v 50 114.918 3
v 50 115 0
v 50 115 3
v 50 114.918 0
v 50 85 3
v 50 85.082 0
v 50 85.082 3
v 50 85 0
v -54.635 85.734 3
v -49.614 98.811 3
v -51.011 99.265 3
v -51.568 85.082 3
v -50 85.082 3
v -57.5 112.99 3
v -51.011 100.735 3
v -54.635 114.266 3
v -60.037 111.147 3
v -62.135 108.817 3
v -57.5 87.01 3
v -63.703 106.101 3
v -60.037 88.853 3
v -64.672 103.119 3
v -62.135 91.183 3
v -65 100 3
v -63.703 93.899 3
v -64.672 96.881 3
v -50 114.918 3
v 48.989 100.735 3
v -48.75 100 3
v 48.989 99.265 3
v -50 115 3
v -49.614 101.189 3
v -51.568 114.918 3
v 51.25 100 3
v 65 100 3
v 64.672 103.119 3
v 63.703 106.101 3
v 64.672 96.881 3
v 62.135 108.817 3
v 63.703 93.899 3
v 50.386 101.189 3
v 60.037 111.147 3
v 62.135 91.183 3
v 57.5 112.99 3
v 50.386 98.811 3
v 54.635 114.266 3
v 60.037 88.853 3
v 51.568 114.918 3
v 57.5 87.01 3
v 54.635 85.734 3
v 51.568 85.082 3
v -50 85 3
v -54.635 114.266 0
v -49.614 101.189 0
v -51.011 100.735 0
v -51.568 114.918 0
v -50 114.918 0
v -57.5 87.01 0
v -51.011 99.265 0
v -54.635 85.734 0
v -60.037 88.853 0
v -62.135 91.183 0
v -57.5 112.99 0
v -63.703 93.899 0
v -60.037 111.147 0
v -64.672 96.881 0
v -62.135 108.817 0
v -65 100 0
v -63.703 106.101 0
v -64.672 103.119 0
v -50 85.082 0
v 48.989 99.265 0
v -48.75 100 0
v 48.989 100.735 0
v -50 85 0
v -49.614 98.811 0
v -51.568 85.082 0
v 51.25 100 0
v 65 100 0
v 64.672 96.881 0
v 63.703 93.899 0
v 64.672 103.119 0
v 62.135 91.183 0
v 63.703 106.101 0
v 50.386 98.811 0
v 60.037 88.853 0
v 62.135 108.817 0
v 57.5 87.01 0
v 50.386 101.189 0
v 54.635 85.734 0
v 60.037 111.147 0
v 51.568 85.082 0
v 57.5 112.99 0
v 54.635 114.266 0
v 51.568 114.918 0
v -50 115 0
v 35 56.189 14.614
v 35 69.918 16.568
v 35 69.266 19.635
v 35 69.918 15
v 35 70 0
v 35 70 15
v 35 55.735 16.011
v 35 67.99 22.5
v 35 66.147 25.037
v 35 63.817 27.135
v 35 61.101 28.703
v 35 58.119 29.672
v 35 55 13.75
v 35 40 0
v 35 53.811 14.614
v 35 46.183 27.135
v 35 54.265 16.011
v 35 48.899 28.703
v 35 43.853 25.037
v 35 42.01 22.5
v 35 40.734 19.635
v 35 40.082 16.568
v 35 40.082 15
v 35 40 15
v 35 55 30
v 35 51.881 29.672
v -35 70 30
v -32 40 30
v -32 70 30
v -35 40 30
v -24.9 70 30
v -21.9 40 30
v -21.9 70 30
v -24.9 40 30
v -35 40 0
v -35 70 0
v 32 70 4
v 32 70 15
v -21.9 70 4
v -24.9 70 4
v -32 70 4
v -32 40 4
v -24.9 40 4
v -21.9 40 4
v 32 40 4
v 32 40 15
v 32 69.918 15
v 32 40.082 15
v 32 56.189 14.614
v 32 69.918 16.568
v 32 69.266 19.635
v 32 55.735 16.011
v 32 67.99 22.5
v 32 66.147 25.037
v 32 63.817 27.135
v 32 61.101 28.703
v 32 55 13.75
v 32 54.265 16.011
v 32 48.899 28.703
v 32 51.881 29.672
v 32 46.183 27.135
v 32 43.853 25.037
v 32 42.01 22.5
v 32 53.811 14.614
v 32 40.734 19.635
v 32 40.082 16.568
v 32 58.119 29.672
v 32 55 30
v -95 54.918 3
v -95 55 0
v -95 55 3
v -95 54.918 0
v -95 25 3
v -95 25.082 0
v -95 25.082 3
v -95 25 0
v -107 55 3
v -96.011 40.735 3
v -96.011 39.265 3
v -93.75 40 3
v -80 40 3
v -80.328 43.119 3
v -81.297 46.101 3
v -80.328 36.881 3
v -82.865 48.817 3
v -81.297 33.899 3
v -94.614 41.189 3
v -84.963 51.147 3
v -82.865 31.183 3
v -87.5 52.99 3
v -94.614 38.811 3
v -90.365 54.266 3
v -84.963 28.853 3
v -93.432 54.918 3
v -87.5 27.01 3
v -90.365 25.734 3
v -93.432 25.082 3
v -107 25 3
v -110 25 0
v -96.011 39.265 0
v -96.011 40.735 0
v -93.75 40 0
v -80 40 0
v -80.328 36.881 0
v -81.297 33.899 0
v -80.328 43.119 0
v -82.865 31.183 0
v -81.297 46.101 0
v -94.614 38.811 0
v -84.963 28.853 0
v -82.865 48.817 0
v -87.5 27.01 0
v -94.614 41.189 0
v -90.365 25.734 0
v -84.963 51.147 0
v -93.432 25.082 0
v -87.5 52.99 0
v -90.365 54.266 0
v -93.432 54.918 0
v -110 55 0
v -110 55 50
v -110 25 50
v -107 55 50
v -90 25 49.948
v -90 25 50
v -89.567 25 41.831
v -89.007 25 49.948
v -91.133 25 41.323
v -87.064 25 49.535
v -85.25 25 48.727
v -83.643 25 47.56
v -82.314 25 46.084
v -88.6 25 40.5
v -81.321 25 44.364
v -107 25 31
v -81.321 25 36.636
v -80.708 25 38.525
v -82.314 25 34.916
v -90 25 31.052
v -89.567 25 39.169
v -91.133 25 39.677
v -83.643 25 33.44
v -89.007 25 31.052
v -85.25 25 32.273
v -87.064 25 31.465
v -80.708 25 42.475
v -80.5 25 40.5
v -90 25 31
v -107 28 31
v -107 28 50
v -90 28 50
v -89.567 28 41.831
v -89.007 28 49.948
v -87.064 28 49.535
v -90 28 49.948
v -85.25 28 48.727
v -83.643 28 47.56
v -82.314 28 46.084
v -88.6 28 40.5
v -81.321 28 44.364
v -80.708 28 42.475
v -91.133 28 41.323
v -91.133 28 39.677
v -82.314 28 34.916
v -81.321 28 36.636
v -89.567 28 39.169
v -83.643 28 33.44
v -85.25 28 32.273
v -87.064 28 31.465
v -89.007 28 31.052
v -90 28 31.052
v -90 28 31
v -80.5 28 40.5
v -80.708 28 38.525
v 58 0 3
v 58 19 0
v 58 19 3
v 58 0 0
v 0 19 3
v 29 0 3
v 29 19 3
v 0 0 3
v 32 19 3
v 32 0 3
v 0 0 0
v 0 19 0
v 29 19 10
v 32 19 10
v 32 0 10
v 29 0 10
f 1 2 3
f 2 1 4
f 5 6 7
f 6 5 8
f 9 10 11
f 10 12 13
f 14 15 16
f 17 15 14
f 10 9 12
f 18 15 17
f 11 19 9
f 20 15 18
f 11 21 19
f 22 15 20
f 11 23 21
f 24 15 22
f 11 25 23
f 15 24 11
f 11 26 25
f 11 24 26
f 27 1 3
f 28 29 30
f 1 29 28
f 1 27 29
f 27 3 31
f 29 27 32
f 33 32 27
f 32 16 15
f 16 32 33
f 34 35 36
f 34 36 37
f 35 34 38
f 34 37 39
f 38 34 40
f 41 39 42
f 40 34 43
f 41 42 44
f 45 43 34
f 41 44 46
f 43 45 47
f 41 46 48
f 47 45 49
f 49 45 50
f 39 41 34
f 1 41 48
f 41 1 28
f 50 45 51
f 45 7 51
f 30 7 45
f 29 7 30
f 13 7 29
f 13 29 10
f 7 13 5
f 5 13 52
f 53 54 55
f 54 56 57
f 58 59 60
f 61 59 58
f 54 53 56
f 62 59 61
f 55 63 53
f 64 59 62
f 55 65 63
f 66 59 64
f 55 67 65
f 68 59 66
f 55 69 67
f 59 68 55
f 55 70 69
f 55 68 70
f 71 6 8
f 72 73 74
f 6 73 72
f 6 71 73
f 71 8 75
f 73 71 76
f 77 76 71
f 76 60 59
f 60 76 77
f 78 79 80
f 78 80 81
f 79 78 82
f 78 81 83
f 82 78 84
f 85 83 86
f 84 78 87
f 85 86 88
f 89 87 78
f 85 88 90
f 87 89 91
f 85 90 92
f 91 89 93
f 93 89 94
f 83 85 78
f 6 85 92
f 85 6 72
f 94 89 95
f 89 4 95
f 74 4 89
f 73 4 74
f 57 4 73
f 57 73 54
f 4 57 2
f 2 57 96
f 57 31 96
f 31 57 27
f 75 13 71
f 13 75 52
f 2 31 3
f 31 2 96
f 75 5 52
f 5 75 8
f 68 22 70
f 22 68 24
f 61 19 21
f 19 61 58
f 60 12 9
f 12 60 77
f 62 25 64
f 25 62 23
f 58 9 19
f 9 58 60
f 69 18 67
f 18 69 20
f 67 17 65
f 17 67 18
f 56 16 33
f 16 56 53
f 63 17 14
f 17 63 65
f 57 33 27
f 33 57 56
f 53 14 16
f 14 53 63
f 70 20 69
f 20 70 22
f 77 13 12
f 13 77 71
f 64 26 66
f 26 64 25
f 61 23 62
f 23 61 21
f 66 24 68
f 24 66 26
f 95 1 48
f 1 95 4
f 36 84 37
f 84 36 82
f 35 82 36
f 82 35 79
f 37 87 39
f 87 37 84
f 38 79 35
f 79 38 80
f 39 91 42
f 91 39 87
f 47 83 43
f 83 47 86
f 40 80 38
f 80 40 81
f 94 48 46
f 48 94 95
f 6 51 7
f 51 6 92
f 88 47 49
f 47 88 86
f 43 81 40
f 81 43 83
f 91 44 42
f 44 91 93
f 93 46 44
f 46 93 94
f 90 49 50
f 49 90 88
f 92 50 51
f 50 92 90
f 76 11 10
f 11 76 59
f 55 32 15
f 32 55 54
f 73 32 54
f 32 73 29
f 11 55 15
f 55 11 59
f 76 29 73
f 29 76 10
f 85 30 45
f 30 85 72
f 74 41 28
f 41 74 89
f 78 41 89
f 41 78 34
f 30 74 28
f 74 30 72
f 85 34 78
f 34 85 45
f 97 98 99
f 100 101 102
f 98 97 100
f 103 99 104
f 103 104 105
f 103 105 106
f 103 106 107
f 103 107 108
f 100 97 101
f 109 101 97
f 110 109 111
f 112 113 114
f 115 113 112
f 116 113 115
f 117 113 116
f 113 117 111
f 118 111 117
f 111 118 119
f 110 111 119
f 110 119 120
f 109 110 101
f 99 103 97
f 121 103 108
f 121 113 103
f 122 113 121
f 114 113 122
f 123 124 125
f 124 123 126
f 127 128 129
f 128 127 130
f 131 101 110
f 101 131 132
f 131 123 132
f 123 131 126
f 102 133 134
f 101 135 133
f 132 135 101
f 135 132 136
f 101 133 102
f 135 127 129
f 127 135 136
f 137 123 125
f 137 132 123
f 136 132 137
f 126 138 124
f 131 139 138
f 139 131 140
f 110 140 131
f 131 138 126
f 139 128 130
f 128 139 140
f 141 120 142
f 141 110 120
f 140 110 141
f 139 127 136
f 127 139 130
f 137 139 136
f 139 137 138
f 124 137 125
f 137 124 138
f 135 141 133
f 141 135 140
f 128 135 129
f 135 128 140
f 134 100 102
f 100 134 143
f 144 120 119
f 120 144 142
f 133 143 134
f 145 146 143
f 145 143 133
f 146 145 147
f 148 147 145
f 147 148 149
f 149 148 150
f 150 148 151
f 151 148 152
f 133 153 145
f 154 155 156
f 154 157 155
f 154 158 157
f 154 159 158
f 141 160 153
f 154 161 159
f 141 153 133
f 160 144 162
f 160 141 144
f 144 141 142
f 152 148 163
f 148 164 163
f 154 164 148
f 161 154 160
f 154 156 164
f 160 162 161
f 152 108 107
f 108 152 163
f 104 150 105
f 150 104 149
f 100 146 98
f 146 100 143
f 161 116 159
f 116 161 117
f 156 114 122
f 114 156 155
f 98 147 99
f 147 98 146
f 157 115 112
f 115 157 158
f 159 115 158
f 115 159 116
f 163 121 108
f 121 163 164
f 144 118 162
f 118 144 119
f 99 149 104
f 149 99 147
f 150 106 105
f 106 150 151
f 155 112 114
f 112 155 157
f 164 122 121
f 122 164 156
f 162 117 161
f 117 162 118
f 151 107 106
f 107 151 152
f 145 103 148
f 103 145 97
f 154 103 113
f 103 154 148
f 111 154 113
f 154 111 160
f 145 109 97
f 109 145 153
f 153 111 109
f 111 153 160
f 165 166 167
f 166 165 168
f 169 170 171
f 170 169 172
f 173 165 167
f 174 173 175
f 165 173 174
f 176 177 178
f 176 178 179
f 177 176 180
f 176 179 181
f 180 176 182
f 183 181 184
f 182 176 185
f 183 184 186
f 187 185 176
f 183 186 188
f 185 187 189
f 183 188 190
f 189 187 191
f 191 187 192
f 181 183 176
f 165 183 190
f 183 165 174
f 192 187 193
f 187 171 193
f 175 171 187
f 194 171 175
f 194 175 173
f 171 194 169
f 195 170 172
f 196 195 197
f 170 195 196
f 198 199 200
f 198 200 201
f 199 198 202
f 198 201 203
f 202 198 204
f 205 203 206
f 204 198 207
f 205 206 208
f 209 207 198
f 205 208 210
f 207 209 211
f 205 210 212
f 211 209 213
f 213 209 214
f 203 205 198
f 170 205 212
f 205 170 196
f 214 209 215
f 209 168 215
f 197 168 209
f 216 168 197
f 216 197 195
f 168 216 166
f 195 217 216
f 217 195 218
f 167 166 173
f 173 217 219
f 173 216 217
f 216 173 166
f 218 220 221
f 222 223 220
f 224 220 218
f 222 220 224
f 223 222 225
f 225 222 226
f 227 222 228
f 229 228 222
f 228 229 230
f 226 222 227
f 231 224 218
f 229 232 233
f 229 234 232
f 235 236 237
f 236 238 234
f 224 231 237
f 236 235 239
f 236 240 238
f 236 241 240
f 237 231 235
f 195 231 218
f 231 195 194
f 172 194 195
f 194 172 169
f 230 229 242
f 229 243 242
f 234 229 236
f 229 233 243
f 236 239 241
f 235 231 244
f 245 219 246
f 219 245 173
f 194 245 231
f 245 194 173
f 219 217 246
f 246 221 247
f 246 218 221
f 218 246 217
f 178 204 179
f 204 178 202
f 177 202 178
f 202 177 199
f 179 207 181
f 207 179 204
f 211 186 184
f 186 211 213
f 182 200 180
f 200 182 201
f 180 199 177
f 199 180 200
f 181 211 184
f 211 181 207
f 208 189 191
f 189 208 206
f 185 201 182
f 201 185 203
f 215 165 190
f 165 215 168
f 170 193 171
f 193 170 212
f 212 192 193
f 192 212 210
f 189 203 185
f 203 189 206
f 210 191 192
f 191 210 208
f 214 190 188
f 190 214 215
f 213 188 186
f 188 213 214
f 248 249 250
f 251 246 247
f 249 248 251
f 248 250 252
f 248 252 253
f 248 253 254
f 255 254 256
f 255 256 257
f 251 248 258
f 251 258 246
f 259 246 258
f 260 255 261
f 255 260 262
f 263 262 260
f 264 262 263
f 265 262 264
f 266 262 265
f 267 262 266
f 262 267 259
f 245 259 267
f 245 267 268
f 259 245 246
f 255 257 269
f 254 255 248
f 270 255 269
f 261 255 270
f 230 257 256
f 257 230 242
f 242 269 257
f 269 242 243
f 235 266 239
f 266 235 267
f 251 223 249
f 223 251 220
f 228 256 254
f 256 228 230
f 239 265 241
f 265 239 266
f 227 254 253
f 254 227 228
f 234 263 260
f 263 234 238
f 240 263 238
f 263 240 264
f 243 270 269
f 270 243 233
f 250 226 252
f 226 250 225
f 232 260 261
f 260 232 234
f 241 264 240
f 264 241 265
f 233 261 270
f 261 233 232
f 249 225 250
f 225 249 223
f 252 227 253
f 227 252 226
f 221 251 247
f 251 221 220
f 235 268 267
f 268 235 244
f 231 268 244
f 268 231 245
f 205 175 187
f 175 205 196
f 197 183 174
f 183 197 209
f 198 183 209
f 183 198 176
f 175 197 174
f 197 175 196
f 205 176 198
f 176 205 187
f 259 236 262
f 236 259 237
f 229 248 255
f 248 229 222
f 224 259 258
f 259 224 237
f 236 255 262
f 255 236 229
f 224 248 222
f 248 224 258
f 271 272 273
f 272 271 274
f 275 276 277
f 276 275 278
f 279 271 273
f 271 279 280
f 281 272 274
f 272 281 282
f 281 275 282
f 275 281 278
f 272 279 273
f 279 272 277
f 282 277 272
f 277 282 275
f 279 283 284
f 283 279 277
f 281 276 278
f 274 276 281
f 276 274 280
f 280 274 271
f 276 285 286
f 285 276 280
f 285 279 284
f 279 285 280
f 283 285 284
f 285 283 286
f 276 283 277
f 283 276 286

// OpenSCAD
//horizontal arm
translate([0,100,0])
	difference(){
		union(){
			translate([-50,-15,0])
				cube([100,30,3]);
			translate([-50,0,0])
				cylinder(h = 3,r = 15);
			translate([50,0,0])
				cylinder(h = 3,r = 15);
		};
	translate([-50,0,-1])
		cylinder(h = 5,r = 1.25);
	translate([50,0,-1])
		cylinder(h = 5,r = 1.25);
	};
//bed attachment
translate([-35,40,0])
	difference(){
		union(){
			difference(){
				cube([70,30,30]);
				translate([3,-1,4])
					cube([7.1, 32, 27]);
				translate([13.1,-1,4])
					cube([60, 32, 27]);
			};
		translate([67, 0, 0])
			cube([3,30,15]);
		translate([67, 15, 15])
			rotate([0,90,0])
				cylinder(h = 3,r = 15);

	
		};
	translate([66, 15, 15])
		rotate([0,90,0])
		cylinder(h = 5,r = 1.25);
	};
//camera swivel
translate([-95,40,0])
	difference(){
		union(){
			translate([-15,-15,0])
				cube([15,30,3]);
			translate([-15,-15,0])
				cube([3,30,50]);
			cylinder(h = 3,r = 15);	
			translate([5,-12,40.5])
				rotate([90,0,0])
					cylinder(h = 3,r = 9.5);	
			translate([-15,-15,31])
				cube([20,3,19]);
	
		};
		translate([0,0,-1])
			cylinder(h = 5,r = 1.25);
		translate([5,-12,40.5])
				rotate([90,0,0])
					cylinder(h = 5,r = 1.4);	
	};

//camera attachment
union(){
	cube([58,19,3]);
	translate ([29,0,0])
		cube([3,19,10]);
}
